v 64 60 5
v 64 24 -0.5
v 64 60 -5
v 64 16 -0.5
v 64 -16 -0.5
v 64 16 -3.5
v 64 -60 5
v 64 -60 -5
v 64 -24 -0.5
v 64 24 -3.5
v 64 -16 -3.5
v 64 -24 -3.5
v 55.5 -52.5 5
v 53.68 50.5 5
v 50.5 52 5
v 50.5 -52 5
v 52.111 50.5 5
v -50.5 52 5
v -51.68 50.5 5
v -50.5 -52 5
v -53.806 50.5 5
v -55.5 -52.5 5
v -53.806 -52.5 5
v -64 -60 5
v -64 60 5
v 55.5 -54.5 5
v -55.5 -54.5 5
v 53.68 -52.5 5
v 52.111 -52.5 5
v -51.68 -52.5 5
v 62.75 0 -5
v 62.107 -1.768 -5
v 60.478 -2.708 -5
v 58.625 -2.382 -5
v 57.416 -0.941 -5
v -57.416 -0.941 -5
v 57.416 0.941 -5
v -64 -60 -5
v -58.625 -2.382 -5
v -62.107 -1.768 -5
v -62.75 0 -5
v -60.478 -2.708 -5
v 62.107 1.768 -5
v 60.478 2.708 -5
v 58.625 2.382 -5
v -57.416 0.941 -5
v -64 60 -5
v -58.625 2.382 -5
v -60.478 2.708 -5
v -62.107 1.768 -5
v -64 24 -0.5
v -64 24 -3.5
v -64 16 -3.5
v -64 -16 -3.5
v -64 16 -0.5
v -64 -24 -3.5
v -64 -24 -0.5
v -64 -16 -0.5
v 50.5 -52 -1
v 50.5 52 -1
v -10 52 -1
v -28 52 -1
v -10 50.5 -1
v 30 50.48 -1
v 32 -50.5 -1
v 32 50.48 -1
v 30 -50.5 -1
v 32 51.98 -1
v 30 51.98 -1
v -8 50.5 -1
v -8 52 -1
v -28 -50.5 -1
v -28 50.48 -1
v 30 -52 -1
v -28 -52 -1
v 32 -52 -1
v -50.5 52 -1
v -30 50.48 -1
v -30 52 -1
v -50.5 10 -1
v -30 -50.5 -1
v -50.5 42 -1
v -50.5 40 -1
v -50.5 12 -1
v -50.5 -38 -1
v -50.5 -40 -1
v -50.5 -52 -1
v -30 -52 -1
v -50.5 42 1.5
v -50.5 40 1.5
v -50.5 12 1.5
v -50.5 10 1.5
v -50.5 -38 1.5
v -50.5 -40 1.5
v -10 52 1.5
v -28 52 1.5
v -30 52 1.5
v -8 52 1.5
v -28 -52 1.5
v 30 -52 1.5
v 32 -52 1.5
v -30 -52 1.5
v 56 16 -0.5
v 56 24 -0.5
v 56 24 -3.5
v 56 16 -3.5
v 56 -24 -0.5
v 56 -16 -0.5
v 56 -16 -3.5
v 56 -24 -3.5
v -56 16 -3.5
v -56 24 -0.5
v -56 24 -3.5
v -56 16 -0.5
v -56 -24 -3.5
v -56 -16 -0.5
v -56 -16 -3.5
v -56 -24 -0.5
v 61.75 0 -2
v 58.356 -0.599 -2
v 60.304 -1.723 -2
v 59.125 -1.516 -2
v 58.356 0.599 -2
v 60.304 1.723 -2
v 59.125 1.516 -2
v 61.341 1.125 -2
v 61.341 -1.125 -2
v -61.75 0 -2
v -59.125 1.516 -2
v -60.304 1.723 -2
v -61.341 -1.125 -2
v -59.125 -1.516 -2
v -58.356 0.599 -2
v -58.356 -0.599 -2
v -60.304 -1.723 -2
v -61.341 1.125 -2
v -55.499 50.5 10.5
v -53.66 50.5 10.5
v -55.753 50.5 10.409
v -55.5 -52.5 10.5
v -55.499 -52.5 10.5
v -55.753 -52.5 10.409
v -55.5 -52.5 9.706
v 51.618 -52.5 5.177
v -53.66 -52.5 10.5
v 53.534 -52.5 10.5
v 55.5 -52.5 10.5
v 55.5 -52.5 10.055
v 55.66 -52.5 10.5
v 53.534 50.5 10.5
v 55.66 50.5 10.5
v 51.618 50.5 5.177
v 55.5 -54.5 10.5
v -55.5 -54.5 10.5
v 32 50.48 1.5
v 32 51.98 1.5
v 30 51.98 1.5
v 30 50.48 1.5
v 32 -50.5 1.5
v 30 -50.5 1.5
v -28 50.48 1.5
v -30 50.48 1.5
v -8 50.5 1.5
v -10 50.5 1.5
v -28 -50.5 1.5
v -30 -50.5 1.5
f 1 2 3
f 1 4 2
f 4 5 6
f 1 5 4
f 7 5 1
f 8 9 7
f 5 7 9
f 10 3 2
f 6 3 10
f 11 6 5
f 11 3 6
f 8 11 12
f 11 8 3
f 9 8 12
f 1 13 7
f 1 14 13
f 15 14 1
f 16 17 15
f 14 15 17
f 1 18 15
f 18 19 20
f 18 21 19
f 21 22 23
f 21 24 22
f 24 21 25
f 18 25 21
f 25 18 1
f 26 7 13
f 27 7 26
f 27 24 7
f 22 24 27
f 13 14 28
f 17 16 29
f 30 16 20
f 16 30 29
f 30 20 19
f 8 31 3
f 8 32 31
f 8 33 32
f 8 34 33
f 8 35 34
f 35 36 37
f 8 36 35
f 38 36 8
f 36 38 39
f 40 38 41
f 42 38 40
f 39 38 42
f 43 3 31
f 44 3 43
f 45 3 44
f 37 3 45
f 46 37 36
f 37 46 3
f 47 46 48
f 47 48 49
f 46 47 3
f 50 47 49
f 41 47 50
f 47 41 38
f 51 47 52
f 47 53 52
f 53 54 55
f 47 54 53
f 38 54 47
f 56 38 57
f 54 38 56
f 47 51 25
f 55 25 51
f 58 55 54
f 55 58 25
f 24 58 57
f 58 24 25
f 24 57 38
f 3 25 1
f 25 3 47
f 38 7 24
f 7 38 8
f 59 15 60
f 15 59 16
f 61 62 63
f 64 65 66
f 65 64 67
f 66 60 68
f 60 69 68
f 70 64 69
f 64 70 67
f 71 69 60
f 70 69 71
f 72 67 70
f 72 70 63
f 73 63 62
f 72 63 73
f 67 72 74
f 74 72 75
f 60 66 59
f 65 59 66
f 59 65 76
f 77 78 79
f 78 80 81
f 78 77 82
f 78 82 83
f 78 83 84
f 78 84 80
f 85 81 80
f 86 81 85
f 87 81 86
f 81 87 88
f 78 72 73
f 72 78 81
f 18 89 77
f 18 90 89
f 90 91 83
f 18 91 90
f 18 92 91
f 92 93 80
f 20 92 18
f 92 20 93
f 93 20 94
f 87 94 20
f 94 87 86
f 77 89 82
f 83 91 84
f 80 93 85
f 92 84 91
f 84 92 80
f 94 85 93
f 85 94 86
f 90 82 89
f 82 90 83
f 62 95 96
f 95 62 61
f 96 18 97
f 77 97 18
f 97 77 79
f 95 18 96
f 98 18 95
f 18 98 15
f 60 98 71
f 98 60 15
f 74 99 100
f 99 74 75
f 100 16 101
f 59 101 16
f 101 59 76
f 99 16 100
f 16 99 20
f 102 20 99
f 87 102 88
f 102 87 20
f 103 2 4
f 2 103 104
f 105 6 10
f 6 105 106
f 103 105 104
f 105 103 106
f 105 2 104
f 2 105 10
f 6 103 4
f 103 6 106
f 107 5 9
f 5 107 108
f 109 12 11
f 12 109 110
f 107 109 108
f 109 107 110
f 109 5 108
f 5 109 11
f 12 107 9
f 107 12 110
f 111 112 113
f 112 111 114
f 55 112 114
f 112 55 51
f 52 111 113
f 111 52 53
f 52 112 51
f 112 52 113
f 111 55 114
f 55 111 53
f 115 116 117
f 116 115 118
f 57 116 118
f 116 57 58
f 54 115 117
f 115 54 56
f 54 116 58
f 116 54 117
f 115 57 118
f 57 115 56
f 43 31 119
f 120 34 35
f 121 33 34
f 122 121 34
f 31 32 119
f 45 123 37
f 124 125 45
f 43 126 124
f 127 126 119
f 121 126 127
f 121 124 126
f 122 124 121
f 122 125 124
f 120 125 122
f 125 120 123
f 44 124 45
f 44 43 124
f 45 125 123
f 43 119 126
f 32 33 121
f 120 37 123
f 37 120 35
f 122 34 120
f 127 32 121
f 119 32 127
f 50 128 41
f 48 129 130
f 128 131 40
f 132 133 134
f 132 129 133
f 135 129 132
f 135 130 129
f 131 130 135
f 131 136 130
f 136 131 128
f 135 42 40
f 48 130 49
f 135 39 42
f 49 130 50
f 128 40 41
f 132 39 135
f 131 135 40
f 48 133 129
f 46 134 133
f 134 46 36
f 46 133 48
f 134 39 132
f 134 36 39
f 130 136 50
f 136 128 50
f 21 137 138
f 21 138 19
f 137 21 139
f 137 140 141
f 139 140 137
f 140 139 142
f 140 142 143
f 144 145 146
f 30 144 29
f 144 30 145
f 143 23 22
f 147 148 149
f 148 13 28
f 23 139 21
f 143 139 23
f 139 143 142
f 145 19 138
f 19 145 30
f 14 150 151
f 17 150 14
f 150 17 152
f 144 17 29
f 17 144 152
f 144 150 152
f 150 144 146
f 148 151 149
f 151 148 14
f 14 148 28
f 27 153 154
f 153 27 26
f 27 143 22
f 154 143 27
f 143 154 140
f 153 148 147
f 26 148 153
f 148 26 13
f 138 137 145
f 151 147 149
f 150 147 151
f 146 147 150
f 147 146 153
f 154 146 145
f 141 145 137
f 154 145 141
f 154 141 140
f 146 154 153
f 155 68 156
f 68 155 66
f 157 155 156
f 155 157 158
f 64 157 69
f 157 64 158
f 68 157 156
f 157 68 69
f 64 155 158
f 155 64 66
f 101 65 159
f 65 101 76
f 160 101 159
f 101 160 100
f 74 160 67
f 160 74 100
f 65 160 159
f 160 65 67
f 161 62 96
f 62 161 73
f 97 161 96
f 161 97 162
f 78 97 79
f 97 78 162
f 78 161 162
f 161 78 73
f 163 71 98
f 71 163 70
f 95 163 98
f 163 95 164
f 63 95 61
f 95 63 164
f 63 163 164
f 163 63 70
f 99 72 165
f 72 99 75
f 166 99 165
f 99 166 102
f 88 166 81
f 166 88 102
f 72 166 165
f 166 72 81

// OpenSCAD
// file: frame.scad
rahmen();

module rahmen() {
difference()  {
union() {
rotate([-19.8, 0, 0]) cube([103, 2, 7]);
translate([0, -105, 0]) rotate([19.8, 0, 0]) cube([103, 2, 7]);
translate([-2, -107, 0]) cube([2, 111, 7]);
}
translate([-2, -110, -1]) cube([120, 120, 1.5]);
translate([-2, -110, 6]) cube([120, 120, 1.5]);
}
}
// main file
use <frame.scad>

x=128;
y=120;
h=10;
platte_x=101;
platte_x_50=104;
platte_y=104;
platte_y_50=51;

    //***Select, please:***
//plate_holder();
plate_holder_tower_frame();
//tower_distance_check();

module plate_holder() {
difference() {
cube([x, y, h], center=true);
    translate([0, 0, 1])
cube([platte_x, platte_y, h-4], center=true);
    translate([0, 0, 6])
cube([platte_x+15, platte_y+15, h-5], center=true);
//chambers for magnets
    translate([60, 20, -2])
    cube([8, 8, 3], center=true);
    translate([60, -20, -2])
    cube([8, 8, 3], center=true);
    translate([-60, 20, -2])
    cube([8, 8, 3], center=true);
    translate([-60, -20, -2])
    cube([8, 8, 3], center=true);
// position hole
   translate([60, 0, -5]) 
   cylinder(d1=5.5, d2=3.5, h=3);
   mirror([1,0,0]) translate([60, 0, -5]) 
   cylinder(d1=5.5, d2=3.5, h=3);
}
//plate spacer
translate([30, platte_y/2-1.52, -4]) cube([2, 1.5, 5.5]);
translate([30, -platte_y/2, -4]) cube([2, 1.5, 5.5]);
translate([-30, platte_y/2-1.52, -4]) cube([2, 1.5, 5.5]);
translate([-30, platte_y/2-1.5, -4]) cube([2, 1.5, 5.5]);
translate([-10, platte_y/2-1.5, -4]) cube([2, 1.5, 5.5]);
translate([-51.5, 40, -4]) cube([1, 2, 5.5]);
translate([-51.5, 10, -4]) cube([1, 2, 5.5]);
translate([-51.5, -40, -4]) cube([1, 2, 5.5]);
translate([-30, -platte_y/2, -4]) cube([2, 1.5, 5.5]);
}
module plate_holder_tower_frame() {
difference() {
cube([x, y, h], center=true);
    translate([0, 0, 2])
cube([platte_x, platte_y, h-4], center=true);
//chambers for magnets
    translate([60, 20, -2])
    cube([8, 8, 3], center=true);
    translate([60, -20, -2])
    cube([8, 8, 3], center=true);
    translate([-60, 20, -2])
    cube([8, 8, 3], center=true);
    translate([-60, -20, -2])
    cube([8, 8, 3], center=true);
// position hole
   translate([60, 0, -5]) 
   cylinder(d1=5.5, d2=3.5, h=3);
   mirror([1,0,0]) translate([60, 0, -5]) 
   cylinder(d1=5.5, d2=3.5, h=3);
}
//plate spacer
translate([30, platte_y/2-1.52, -4]) cube([2, 1.5, 5.5]);
translate([30, -platte_y/2, -4]) cube([2, 1.5, 5.5]);
translate([-30, platte_y/2-1.52, -4]) cube([2, 1.5, 5.5]);
translate([-30, platte_y/2-1.5, -4]) cube([2, 1.5, 5.5]);
translate([-10, platte_y/2-1.5, -4]) cube([2, 1.5, 5.5]);
translate([-51.5, 40, -4]) cube([1, 2, 5.5]);
translate([-51.5, 10, -4]) cube([1, 2, 5.5]);
translate([-51.5, -40, -4]) cube([1, 2, 5.5]);
translate([-30, -platte_y/2, -4]) cube([2, 1.5, 5.5]);
//tower frame on plate holder
rotate([0, 0, 90]) translate([-platte_y/2+1.5-2, 50.5+1, 4.5]) rahmen();
}
module tower_distance_check() {
    difference() {
    union() {
    cube([100, 100, 7], center=true);
    translate([0, 0, 3]) cube([103, 103, 1], center=true);
    }
    cube([90, 90, 8], center=true);
    }
}
